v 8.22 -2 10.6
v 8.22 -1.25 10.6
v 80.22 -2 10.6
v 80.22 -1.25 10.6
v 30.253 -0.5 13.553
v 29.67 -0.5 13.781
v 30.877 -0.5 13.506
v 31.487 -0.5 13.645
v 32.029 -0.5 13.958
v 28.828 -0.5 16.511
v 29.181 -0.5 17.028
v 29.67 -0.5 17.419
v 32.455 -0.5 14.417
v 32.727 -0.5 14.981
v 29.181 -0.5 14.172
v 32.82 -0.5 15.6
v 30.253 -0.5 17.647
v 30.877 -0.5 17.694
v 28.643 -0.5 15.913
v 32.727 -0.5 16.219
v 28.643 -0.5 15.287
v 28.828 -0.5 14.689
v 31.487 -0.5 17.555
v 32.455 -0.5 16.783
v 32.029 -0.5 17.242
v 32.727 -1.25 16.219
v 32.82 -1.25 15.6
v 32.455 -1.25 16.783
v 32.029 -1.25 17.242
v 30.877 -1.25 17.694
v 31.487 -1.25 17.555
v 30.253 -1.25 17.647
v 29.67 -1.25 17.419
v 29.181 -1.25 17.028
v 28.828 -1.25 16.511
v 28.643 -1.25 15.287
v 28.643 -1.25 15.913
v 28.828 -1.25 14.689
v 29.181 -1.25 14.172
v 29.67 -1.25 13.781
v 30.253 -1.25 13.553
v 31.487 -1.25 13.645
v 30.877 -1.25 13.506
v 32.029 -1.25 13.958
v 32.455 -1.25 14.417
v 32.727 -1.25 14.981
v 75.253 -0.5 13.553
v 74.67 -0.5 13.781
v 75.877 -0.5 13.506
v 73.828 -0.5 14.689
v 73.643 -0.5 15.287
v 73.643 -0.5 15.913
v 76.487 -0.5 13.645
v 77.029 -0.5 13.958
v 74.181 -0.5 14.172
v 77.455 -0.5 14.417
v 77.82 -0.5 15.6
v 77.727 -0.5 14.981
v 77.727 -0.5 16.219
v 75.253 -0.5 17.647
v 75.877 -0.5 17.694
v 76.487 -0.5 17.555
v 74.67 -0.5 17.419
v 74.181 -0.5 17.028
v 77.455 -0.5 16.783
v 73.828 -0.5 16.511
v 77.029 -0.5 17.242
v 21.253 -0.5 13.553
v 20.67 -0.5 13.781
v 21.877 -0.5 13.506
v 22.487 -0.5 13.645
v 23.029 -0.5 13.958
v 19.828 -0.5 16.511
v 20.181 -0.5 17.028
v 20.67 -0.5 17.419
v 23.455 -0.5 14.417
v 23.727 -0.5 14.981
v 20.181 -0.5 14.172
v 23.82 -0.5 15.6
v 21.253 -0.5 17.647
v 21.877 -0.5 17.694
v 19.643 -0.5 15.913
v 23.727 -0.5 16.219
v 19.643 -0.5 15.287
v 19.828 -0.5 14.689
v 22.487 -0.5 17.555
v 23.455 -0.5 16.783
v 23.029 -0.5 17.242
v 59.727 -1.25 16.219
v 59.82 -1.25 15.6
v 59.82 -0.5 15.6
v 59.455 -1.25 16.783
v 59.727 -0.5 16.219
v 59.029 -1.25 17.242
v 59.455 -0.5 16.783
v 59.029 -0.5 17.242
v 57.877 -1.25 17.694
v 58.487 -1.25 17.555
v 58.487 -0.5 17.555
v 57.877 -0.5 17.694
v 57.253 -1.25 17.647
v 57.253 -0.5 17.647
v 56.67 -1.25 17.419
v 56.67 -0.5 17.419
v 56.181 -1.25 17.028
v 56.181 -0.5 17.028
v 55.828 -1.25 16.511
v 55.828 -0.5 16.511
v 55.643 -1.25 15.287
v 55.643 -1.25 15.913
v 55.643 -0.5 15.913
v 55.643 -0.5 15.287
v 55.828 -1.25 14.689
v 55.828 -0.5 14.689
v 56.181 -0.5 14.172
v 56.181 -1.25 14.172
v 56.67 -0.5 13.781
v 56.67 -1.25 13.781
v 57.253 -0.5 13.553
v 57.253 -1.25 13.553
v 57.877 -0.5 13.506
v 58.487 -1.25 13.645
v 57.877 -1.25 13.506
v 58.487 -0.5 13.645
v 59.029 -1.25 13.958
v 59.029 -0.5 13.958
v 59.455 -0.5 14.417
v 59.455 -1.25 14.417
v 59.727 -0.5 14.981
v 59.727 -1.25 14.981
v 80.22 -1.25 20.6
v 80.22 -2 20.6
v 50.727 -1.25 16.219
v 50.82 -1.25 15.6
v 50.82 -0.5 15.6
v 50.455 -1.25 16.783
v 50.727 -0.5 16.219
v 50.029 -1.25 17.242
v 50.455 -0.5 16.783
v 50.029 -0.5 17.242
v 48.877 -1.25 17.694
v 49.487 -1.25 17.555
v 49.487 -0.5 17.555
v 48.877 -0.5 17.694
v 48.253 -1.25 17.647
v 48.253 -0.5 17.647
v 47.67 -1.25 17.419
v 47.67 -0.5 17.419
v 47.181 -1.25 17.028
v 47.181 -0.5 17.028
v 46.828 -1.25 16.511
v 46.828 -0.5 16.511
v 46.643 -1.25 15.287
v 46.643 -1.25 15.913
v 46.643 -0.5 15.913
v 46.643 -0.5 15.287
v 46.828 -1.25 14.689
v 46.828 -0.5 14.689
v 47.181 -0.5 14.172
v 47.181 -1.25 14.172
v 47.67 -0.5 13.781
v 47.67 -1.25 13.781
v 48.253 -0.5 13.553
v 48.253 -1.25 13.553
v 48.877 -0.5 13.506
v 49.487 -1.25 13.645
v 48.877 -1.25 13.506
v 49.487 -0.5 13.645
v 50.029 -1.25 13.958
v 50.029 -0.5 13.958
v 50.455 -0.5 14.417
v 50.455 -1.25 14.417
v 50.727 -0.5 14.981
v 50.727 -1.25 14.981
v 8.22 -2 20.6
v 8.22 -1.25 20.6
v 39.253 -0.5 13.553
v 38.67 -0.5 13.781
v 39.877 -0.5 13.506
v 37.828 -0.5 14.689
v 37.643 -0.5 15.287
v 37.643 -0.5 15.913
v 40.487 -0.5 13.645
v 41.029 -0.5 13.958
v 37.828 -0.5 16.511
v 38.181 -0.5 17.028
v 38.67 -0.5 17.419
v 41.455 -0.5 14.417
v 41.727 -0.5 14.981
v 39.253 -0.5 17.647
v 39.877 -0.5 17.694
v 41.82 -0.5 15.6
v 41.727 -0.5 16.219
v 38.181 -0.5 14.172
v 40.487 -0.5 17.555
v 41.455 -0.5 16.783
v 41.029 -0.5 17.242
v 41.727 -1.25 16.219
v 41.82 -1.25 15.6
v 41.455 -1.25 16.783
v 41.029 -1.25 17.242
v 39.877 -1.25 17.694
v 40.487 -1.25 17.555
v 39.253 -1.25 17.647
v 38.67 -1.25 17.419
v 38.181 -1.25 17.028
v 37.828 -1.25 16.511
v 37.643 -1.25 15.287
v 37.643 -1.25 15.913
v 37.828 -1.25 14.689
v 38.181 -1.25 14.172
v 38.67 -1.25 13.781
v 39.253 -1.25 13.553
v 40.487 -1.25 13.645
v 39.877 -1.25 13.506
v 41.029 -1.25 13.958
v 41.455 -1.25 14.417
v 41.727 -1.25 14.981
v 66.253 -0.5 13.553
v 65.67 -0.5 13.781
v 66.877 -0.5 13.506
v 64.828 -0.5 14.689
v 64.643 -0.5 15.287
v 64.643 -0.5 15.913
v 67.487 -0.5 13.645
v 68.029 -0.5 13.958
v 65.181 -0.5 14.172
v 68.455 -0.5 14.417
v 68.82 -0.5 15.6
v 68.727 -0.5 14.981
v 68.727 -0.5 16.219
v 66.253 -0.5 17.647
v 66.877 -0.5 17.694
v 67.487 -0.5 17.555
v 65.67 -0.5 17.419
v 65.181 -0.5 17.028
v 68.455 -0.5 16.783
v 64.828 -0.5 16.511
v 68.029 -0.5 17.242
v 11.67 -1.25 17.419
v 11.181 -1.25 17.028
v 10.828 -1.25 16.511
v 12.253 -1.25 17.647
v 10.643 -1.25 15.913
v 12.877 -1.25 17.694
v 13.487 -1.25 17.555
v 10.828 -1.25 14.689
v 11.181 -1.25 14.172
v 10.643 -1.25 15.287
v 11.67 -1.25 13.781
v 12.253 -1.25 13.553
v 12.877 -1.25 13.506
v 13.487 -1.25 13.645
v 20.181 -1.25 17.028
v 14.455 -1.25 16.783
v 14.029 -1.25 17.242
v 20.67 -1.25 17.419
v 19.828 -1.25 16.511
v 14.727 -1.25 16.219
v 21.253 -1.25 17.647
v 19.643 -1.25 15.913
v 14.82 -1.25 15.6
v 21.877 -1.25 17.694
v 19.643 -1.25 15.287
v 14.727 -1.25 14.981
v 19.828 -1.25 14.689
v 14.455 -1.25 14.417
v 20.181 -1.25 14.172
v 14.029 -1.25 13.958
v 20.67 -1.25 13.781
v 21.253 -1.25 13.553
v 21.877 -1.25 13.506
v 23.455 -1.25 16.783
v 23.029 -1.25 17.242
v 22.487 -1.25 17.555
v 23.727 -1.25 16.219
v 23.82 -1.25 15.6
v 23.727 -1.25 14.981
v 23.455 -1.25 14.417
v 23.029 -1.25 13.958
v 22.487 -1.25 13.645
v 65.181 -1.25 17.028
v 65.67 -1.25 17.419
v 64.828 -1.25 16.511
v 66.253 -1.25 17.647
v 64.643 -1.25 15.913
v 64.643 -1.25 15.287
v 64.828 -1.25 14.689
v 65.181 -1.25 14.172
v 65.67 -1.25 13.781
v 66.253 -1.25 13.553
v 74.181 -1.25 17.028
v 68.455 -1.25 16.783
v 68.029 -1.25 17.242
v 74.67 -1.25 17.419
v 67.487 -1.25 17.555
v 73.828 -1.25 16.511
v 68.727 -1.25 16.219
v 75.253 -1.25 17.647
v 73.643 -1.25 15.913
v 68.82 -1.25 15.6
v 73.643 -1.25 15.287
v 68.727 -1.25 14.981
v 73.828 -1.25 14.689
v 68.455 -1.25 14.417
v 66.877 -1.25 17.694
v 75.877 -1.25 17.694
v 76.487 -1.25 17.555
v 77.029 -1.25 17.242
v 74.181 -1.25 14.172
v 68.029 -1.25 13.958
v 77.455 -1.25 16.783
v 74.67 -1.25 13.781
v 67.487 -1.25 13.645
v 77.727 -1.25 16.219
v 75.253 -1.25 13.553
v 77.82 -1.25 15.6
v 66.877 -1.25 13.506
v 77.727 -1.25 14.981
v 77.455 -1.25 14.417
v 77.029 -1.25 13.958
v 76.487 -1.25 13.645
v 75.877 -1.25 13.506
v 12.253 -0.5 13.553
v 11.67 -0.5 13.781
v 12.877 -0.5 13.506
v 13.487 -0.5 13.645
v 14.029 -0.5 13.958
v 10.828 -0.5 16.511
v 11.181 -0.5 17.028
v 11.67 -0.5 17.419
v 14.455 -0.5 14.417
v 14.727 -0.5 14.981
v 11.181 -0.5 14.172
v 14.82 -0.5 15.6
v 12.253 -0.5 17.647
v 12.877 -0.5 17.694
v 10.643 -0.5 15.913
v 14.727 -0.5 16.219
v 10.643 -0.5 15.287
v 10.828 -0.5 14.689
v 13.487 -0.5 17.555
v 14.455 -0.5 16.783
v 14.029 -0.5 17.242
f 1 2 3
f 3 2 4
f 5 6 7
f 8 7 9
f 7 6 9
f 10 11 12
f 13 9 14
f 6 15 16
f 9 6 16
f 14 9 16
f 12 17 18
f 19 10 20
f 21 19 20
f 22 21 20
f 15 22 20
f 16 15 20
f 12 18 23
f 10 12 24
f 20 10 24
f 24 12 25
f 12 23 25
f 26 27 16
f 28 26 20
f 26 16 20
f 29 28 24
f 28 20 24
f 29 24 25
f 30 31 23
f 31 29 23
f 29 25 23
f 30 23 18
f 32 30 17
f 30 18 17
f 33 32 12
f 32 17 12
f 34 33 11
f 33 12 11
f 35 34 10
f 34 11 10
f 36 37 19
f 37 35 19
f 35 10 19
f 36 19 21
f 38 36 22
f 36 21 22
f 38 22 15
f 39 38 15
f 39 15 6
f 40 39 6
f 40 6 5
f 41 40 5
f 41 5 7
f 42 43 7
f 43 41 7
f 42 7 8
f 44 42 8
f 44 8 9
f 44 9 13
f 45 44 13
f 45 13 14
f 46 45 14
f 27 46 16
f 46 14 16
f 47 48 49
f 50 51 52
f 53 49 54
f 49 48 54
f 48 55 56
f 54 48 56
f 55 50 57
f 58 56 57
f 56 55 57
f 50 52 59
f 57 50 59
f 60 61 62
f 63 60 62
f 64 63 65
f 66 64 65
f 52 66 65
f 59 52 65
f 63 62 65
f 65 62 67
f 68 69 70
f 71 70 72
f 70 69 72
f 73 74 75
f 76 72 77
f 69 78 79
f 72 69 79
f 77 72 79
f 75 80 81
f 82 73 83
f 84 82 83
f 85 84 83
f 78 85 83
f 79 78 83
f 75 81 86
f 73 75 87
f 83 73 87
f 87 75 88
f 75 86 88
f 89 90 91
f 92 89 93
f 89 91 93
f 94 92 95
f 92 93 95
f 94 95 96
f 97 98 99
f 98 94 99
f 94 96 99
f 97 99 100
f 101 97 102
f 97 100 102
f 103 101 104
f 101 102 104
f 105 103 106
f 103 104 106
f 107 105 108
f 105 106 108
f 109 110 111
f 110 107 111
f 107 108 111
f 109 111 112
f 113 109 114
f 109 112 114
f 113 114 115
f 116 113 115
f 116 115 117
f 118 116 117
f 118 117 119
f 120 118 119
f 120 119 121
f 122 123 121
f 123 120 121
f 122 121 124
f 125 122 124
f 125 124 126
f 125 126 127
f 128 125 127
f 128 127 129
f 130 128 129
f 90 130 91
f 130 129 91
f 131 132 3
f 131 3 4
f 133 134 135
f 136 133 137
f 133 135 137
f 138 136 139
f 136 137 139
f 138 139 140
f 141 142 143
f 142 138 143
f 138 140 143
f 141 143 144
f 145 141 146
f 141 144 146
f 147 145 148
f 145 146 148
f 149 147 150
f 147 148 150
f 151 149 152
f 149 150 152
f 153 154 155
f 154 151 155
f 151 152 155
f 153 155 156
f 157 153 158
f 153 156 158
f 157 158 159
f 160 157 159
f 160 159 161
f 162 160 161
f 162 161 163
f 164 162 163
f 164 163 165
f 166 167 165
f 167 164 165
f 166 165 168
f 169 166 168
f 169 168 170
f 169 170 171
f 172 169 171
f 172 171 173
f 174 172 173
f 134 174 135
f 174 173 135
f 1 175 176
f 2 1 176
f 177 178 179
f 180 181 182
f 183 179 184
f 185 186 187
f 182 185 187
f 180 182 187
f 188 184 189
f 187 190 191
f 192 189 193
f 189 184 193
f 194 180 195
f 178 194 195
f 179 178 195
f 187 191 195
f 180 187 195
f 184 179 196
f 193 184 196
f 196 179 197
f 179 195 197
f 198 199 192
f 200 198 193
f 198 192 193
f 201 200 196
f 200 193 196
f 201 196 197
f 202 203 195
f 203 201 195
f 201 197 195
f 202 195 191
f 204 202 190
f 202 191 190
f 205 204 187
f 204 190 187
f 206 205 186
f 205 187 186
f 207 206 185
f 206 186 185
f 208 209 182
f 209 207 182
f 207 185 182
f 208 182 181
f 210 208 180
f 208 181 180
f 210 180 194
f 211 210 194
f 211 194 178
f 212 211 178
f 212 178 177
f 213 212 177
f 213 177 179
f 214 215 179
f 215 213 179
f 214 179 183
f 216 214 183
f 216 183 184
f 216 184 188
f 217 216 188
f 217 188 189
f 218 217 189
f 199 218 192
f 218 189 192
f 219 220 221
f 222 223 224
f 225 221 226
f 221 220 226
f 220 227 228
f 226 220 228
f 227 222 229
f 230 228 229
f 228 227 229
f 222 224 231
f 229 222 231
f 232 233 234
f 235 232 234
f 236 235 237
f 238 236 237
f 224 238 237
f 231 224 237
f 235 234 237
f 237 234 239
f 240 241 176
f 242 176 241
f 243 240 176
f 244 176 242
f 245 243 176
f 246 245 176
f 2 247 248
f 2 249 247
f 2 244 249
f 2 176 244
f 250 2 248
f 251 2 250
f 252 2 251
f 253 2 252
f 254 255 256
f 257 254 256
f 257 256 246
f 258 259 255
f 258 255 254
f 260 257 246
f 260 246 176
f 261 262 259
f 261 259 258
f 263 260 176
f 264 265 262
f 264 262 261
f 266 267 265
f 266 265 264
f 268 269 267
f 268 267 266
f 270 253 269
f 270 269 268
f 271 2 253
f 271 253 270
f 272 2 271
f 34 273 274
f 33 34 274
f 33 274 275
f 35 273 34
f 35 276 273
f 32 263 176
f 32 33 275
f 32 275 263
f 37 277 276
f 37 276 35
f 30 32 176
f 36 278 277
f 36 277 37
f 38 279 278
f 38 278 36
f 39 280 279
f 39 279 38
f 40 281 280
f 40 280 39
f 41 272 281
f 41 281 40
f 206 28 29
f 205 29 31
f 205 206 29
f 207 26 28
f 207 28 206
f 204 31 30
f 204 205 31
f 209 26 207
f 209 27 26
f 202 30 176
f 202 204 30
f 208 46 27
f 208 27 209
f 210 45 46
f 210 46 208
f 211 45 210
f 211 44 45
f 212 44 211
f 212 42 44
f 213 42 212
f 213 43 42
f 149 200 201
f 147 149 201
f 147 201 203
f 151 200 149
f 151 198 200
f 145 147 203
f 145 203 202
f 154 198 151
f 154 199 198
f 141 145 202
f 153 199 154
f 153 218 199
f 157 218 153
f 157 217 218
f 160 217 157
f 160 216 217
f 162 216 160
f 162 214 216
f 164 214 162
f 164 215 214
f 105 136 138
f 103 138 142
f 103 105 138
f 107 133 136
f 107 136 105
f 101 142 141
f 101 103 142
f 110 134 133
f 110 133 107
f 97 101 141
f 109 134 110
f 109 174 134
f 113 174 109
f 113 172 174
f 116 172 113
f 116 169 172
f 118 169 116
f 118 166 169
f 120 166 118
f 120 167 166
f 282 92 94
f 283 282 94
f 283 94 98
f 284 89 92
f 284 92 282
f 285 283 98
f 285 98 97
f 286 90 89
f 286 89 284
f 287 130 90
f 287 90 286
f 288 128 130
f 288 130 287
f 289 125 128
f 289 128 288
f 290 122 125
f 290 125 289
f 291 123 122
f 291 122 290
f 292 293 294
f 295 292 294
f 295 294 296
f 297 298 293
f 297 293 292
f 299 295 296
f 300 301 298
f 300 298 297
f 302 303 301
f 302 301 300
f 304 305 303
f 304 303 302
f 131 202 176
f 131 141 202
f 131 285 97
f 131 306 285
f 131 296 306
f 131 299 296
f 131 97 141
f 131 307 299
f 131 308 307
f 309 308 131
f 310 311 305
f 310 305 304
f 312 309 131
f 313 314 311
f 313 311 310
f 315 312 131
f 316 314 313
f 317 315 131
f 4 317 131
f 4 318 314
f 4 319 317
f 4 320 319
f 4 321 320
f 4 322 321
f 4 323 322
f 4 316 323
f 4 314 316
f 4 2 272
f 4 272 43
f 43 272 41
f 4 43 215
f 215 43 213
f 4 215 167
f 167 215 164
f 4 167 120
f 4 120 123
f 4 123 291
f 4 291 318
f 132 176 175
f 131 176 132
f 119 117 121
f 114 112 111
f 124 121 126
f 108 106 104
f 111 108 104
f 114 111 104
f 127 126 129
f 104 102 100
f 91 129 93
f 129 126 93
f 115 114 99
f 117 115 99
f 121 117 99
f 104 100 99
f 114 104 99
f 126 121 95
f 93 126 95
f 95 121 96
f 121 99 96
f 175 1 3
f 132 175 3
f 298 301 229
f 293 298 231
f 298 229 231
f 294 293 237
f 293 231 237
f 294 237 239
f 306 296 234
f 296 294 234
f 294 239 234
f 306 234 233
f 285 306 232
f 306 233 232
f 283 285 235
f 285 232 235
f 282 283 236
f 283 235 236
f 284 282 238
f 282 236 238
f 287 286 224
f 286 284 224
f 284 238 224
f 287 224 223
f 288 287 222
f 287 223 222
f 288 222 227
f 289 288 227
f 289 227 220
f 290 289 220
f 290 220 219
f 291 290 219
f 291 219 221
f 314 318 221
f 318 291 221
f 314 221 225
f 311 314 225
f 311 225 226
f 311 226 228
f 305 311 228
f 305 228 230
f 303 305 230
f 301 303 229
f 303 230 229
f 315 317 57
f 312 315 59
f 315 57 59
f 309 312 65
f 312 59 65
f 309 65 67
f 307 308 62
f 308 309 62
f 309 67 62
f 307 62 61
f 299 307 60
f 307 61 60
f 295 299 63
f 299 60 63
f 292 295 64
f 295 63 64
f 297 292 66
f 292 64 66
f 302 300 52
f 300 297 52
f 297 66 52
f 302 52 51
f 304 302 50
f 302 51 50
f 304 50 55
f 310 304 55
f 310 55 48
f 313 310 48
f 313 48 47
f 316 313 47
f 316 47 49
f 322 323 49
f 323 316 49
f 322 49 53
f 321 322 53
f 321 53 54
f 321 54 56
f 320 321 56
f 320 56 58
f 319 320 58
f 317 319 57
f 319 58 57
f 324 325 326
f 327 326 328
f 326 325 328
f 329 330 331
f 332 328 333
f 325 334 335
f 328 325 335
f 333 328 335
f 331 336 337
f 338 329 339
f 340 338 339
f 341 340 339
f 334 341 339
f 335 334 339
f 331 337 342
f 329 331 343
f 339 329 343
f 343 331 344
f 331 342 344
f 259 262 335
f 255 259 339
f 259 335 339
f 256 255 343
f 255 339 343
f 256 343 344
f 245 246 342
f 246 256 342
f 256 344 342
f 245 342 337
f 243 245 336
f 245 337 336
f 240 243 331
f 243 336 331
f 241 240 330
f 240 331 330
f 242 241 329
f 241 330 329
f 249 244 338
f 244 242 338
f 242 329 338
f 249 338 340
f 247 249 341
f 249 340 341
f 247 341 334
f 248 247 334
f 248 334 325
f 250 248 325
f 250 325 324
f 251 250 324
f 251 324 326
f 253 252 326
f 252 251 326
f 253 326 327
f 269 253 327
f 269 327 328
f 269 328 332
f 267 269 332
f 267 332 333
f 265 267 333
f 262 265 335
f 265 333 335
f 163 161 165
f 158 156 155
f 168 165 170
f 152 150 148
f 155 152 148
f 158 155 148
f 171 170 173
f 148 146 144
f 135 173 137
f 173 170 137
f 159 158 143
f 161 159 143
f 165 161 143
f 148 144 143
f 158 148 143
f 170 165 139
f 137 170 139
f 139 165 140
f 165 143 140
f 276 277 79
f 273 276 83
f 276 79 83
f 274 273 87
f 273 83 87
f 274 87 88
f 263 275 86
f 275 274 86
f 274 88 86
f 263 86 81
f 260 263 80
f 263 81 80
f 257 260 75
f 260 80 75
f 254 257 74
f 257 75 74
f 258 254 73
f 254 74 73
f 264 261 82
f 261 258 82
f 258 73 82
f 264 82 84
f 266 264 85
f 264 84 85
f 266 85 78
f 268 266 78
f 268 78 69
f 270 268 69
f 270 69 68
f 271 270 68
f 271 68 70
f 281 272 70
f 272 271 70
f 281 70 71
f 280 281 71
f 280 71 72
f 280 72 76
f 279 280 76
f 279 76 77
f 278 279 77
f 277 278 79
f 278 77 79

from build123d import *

# Parameters (mm, degrees)
CYLINDER010_R          = 2.1
CYLINDER010_DEPTH      = 1.5
CYLINDER010_ROLL_ANGLE = 90
CYLINDER008_R          = 2.1
CYLINDER008_DEPTH      = 1.5
CYLINDER008_ROLL_ANGLE = 90
CYLINDER011_R          = 2.1
CYLINDER011_DEPTH      = 1.5
CYLINDER011_ROLL_ANGLE = 90
CYLINDER013_R          = 2.1
CYLINDER013_DEPTH      = 1.5
CYLINDER013_ROLL_ANGLE = 90
CYLINDER012_R          = 2.1
CYLINDER012_DEPTH      = 1.5
CYLINDER012_ROLL_ANGLE = 90
CYLINDER014_R          = 2.1
CYLINDER014_DEPTH      = 1.5
CYLINDER014_ROLL_ANGLE = 90
CYLINDER009_R          = 2.1
CYLINDER009_DEPTH      = 1.5
CYLINDER009_ROLL_ANGLE = 90
CYLINDER_R             = 2.1
CYLINDER_DEPTH         = 1.5
CYLINDER_ROLL_ANGLE    = 90
BOX006_W               = 72
BOX006_H               = 0.75
BOX006_DEPTH           = 10


with BuildPart() as cylinder004:
    # Cylinder010 → Cylinder010 (new body)
    with BuildSketch(Plane.XY):
        Circle(CYLINDER010_R)
    extrude(amount=CYLINDER010_DEPTH)


with BuildPart() as cylinder004_1:
    # Cylinder010 roll: moved
    add(cylinder004.part.rotate(Axis((0, 0, 0), (1, 0, 0)), CYLINDER010_ROLL_ANGLE))


with BuildPart() as cylinder004_2:
    # Cylinder010 placement: moved
    add(cylinder004_1.part.moved(Location((39.72, -0.5, 15.6))))


with BuildPart() as cylinder002:
    # Cylinder008 → Cylinder008 (new body)
    with BuildSketch(Plane.XY):
        Circle(CYLINDER008_R)
    extrude(amount=CYLINDER008_DEPTH)


with BuildPart() as cylinder002_1:
    # Cylinder008 roll: moved
    add(cylinder002.part.rotate(Axis((0, 0, 0), (1, 0, 0)), CYLINDER008_ROLL_ANGLE))


with BuildPart() as cylinder002_2:
    # Cylinder008 placement: moved
    add(cylinder002_1.part.moved(Location((21.72, -0.5, 15.6))))


with BuildPart() as cylinder005:
    # Cylinder011 → Cylinder011 (new body)
    with BuildSketch(Plane.XY):
        Circle(CYLINDER011_R)
    extrude(amount=CYLINDER011_DEPTH)


with BuildPart() as cylinder005_1:
    # Cylinder011 roll: moved
    add(cylinder005.part.rotate(Axis((0, 0, 0), (1, 0, 0)), CYLINDER011_ROLL_ANGLE))


with BuildPart() as cylinder005_2:
    # Cylinder011 placement: moved
    add(cylinder005_1.part.moved(Location((48.72, -0.5, 15.6))))


with BuildPart() as cylinder007:
    # Cylinder013 → Cylinder013 (new body)
    with BuildSketch(Plane.XY):
        Circle(CYLINDER013_R)
    extrude(amount=CYLINDER013_DEPTH)


with BuildPart() as cylinder007_1:
    # Cylinder013 roll: moved
    add(cylinder007.part.rotate(Axis((0, 0, 0), (1, 0, 0)), CYLINDER013_ROLL_ANGLE))


with BuildPart() as cylinder007_2:
    # Cylinder013 placement: moved
    add(cylinder007_1.part.moved(Location((66.72, -0.5, 15.6))))


with BuildPart() as cylinder006:
    # Cylinder012 → Cylinder012 (new body)
    with BuildSketch(Plane.XY):
        Circle(CYLINDER012_R)
    extrude(amount=CYLINDER012_DEPTH)


with BuildPart() as cylinder006_1:
    # Cylinder012 roll: moved
    add(cylinder006.part.rotate(Axis((0, 0, 0), (1, 0, 0)), CYLINDER012_ROLL_ANGLE))


with BuildPart() as cylinder006_2:
    # Cylinder012 placement: moved
    add(cylinder006_1.part.moved(Location((57.72, -0.5, 15.6))))


with BuildPart() as cylinder008:
    # Cylinder014 → Cylinder014 (new body)
    with BuildSketch(Plane.XY):
        Circle(CYLINDER014_R)
    extrude(amount=CYLINDER014_DEPTH)


with BuildPart() as cylinder008_1:
    # Cylinder014 roll: moved
    add(cylinder008.part.rotate(Axis((0, 0, 0), (1, 0, 0)), CYLINDER014_ROLL_ANGLE))


with BuildPart() as cylinder008_2:
    # Cylinder014 placement: moved
    add(cylinder008_1.part.moved(Location((75.72, -0.5, 15.6))))


with BuildPart() as cylinder003:
    # Cylinder009 → Cylinder009 (new body)
    with BuildSketch(Plane.XY):
        Circle(CYLINDER009_R)
    extrude(amount=CYLINDER009_DEPTH)


with BuildPart() as cylinder003_1:
    # Cylinder009 roll: moved
    add(cylinder003.part.rotate(Axis((0, 0, 0), (1, 0, 0)), CYLINDER009_ROLL_ANGLE))


with BuildPart() as cylinder003_2:
    # Cylinder009 placement: moved
    add(cylinder003_1.part.moved(Location((30.72, -0.5, 15.6))))


with BuildPart() as cylinder001:
    # Cylinder → Cylinder (new body)
    with BuildSketch(Plane.XY):
        Circle(CYLINDER_R)
    extrude(amount=CYLINDER_DEPTH)


with BuildPart() as cylinder001_1:
    # Cylinder roll: moved
    add(cylinder001.part.rotate(Axis((0, 0, 0), (1, 0, 0)), CYLINDER_ROLL_ANGLE))


with BuildPart() as cylinder001_2:
    # Cylinder placement: moved
    add(cylinder001_1.part.moved(Location((12.72, -0.5, 15.6))))


with BuildPart() as fusion003005009011:
    # Box006 → Box006 (new body)
    with BuildSketch(Plane(origin=(8.22, -2, 10.6), x_dir=(1, 0, 0), z_dir=(0, 0, 1))):
        with Locations((36, 0.375)):
            Rectangle(BOX006_W, BOX006_H)
    extrude(amount=BOX006_DEPTH)

    # Fusion003005009011: union Cylinder004, Cylinder002, Cylinder005, Cylinder007, Cylinder006, Cylinder008, Cylinder003, Cylinder001
    add(cylinder004_2.part)
    add(cylinder002_2.part)
    add(cylinder005_2.part)
    add(cylinder007_2.part)
    add(cylinder006_2.part)
    add(cylinder008_2.part)
    add(cylinder003_2.part)
    add(cylinder001_2.part)


solid = fusion003005009011.part
